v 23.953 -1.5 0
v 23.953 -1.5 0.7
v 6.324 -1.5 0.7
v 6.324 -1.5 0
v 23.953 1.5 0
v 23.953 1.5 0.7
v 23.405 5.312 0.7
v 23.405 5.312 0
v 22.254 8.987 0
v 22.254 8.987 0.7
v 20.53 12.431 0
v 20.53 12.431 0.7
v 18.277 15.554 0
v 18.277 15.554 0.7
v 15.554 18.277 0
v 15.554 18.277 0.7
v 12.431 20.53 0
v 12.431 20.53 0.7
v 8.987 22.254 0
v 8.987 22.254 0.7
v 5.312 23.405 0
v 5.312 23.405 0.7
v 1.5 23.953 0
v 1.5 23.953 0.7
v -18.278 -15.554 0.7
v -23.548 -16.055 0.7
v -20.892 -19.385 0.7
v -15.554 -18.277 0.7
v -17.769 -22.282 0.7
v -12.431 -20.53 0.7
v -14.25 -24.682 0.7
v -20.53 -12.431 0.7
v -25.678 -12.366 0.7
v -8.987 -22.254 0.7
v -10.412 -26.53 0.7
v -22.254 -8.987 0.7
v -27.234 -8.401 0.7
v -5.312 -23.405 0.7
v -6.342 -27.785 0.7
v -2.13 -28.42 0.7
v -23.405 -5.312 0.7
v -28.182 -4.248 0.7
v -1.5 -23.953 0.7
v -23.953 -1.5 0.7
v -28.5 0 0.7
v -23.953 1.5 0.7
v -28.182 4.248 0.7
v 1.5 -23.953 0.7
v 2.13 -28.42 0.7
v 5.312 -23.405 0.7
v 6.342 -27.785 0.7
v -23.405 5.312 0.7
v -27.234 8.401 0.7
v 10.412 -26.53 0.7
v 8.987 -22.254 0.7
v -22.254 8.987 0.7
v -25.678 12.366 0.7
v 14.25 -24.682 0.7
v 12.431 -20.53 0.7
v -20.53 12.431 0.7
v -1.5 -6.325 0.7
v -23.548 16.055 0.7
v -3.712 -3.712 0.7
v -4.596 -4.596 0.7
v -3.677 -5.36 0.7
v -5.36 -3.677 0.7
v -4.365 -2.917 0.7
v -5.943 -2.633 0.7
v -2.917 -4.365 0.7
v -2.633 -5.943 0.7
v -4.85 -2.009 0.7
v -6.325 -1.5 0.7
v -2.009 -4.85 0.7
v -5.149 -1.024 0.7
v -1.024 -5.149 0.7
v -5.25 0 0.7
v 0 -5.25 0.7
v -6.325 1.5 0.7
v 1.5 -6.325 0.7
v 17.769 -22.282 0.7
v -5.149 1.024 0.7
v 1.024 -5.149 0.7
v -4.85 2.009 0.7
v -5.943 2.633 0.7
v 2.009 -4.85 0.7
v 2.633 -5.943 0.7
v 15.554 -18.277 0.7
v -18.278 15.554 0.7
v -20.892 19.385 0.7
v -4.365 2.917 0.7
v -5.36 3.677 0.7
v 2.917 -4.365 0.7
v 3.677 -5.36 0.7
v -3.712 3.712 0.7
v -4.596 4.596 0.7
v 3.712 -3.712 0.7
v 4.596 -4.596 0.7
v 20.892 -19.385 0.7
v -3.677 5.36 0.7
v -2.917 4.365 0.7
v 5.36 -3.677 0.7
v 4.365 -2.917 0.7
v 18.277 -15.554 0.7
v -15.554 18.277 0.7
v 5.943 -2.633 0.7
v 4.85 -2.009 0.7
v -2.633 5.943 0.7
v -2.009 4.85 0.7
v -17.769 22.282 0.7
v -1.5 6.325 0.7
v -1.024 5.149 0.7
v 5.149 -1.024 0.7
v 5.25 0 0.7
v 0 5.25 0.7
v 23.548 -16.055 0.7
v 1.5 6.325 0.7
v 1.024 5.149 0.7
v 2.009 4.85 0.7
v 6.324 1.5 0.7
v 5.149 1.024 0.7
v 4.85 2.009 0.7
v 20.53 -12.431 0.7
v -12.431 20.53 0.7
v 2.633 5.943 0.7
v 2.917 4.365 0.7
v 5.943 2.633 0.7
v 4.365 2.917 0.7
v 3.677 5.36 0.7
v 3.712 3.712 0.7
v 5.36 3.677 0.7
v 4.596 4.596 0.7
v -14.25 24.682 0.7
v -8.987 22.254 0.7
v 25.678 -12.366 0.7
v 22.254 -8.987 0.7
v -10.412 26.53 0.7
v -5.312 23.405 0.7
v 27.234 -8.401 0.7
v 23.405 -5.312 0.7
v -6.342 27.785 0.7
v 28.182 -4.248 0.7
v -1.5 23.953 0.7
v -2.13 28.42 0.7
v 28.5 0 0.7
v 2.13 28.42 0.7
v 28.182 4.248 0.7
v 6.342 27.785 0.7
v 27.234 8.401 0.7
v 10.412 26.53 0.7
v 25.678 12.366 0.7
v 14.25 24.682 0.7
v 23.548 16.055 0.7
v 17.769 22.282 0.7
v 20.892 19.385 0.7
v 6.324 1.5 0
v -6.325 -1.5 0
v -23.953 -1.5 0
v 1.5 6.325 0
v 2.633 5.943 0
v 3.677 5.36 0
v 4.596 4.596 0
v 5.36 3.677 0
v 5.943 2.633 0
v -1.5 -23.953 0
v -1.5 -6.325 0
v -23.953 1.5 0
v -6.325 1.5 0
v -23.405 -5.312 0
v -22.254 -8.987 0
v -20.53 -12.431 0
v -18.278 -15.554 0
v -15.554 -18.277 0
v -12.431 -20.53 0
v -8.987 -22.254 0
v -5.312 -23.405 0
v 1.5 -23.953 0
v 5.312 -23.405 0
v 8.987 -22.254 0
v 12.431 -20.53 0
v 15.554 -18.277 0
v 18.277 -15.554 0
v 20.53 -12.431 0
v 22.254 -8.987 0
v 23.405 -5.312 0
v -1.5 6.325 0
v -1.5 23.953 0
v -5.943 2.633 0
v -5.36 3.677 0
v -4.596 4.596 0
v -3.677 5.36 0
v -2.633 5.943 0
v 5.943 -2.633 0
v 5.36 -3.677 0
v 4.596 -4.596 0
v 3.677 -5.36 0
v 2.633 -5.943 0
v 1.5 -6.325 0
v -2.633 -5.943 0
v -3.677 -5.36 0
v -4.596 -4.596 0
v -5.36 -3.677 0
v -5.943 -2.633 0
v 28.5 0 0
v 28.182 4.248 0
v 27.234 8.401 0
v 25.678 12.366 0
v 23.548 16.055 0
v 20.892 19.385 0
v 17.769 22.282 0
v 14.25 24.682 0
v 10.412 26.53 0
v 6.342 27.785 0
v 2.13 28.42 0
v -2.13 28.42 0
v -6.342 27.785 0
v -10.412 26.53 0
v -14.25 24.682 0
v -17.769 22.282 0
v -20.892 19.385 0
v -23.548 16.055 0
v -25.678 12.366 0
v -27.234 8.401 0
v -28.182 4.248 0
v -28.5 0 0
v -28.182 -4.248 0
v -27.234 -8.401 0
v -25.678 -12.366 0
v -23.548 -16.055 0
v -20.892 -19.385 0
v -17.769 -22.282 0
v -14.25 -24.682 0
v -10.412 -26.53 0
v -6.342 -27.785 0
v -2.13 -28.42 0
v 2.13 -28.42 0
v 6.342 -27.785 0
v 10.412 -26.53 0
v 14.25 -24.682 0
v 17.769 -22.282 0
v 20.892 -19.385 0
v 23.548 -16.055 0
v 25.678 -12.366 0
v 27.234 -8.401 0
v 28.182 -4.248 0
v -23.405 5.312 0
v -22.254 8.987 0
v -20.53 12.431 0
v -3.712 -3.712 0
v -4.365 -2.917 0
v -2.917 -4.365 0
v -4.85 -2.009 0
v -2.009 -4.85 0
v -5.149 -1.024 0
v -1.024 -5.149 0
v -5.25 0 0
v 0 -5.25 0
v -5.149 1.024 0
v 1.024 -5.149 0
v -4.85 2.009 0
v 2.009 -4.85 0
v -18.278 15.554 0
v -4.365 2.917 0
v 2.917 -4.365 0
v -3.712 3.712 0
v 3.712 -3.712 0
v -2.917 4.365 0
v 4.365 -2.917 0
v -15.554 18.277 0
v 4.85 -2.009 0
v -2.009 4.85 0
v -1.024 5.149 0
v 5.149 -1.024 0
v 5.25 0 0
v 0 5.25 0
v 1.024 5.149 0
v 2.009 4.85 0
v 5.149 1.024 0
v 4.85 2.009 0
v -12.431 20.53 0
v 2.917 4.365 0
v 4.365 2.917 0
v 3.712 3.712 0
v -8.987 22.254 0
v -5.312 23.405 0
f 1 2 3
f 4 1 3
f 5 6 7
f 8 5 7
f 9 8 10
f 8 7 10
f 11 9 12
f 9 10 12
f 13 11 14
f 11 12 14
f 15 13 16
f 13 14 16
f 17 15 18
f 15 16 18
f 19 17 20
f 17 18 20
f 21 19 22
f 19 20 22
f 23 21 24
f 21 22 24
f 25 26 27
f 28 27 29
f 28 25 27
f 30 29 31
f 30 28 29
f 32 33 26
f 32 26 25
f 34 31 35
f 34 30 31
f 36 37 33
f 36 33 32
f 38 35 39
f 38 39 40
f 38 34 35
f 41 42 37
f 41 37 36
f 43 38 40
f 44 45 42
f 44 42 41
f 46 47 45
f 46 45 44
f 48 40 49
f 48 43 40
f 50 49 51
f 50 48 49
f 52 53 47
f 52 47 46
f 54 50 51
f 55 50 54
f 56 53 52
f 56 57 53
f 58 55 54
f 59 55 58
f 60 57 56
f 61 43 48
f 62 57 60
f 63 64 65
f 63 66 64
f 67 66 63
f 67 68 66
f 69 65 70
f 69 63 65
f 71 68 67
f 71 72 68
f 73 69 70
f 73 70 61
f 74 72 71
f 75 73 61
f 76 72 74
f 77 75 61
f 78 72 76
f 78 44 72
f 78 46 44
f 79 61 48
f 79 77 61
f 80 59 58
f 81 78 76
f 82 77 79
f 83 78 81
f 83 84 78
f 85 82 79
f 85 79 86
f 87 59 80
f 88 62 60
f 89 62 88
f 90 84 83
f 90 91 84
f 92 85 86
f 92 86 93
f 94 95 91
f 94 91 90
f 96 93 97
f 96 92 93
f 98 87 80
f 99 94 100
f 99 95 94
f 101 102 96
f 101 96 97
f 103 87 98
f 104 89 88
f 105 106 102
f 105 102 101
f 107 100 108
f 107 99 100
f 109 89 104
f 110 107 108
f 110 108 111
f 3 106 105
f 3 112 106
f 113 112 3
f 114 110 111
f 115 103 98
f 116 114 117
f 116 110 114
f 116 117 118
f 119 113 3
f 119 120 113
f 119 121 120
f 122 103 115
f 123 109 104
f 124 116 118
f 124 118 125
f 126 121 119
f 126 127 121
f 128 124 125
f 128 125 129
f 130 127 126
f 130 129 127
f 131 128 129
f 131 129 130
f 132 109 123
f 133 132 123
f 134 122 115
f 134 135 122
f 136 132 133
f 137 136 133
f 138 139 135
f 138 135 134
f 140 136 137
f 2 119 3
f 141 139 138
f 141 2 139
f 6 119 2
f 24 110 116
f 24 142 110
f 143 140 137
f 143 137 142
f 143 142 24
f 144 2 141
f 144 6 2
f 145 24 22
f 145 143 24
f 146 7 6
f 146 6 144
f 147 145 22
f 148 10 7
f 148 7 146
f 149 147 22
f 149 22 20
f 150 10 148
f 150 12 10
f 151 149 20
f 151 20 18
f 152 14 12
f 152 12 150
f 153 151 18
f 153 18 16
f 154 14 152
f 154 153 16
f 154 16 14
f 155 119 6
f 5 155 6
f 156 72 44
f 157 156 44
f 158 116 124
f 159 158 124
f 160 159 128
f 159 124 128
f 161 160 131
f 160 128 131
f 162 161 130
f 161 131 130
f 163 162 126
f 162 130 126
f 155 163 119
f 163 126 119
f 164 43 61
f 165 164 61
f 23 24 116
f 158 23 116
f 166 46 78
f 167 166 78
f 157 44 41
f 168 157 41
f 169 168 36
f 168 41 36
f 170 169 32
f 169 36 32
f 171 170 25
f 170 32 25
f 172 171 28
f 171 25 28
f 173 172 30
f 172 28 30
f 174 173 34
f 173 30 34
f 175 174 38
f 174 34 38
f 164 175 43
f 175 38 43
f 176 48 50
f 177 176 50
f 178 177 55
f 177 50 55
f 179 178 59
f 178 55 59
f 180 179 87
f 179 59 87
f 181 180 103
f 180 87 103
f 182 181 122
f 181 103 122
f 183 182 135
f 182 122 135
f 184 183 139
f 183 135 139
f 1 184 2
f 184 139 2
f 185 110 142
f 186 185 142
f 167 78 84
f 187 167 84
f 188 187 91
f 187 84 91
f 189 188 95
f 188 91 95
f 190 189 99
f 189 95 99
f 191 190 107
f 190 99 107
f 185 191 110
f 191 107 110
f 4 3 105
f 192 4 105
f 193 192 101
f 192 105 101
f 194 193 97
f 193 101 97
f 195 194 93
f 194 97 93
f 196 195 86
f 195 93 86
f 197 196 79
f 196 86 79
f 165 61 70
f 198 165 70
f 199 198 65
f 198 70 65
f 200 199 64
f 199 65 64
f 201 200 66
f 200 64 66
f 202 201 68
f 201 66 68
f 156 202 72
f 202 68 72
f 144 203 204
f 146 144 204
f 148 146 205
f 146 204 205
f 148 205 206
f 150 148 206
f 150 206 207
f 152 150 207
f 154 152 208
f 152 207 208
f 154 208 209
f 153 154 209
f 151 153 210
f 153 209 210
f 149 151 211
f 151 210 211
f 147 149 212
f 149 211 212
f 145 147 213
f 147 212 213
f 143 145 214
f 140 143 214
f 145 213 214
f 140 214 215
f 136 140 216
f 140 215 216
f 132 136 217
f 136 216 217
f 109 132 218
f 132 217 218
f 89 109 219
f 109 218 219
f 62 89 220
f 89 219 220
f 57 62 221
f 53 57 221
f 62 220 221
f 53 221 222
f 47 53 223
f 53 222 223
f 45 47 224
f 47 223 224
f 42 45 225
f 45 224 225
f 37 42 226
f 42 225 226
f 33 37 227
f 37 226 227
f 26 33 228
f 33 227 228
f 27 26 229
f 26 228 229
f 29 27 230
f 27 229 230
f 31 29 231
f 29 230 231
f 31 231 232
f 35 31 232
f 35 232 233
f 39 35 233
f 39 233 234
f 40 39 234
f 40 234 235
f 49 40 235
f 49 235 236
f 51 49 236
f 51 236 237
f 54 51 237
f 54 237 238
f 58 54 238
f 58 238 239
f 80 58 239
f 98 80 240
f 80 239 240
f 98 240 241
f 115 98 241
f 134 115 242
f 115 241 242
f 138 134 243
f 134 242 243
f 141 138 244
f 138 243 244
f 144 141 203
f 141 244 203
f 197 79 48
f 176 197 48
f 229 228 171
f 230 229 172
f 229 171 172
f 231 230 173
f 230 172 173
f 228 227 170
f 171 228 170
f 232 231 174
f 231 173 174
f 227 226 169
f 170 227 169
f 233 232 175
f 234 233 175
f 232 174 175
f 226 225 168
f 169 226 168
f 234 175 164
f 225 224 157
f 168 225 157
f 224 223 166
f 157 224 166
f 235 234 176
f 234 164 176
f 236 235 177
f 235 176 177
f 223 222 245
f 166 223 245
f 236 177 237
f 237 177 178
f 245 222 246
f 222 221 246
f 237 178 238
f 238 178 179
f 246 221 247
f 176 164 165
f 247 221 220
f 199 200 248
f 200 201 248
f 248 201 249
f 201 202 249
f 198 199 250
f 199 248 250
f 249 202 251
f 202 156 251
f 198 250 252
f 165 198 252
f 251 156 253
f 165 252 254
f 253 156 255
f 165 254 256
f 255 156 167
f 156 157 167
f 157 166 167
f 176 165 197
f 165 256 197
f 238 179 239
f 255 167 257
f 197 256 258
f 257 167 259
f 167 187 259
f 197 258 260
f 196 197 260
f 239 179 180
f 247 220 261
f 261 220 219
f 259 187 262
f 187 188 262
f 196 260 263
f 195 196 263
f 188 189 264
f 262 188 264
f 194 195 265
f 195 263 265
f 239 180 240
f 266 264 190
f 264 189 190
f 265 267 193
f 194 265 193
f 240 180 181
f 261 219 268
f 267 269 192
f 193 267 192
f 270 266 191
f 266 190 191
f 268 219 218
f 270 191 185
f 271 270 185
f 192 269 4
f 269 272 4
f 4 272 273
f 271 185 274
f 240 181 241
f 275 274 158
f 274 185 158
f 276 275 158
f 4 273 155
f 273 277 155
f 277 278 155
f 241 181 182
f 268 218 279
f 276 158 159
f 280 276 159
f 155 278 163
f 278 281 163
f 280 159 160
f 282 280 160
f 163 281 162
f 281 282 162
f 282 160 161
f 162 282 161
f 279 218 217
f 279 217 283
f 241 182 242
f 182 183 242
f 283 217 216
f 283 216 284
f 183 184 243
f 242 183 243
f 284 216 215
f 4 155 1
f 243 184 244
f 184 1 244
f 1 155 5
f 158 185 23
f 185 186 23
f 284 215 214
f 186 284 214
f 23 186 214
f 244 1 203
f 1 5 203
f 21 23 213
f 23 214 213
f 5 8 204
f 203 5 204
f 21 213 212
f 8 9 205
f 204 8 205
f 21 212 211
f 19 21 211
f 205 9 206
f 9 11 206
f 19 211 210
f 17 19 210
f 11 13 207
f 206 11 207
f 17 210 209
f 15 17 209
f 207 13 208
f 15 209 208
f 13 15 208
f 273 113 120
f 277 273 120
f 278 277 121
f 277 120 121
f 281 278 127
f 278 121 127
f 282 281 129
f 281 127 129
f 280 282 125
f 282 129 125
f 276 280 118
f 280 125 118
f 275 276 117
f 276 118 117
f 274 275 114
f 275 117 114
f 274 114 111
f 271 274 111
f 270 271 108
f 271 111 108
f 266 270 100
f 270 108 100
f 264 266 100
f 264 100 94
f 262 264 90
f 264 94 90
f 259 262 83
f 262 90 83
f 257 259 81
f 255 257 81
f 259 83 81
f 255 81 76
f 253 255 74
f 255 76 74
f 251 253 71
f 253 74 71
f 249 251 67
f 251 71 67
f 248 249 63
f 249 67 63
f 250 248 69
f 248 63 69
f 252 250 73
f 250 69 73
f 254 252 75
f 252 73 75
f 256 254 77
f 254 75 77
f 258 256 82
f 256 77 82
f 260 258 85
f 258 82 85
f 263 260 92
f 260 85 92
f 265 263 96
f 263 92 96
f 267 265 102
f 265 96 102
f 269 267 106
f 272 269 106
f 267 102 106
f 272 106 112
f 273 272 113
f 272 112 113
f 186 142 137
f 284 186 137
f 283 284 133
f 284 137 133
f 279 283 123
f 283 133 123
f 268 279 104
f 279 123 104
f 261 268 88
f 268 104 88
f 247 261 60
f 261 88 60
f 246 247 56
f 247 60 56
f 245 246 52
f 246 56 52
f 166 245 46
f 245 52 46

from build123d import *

# Parameters (mm, degrees)
F0_R     = 28.5
F1_DEPTH = 0.7
F2_R     = 5.25
F3_DEPTH = 0.7
F5_DEPTH = 0.7


with BuildPart() as f1:
    # F0 (on Top) → F1 (new body)
    with BuildSketch(Plane.XY):
        Circle(F0_R)
    extrude(amount=F1_DEPTH)

    # F2 (on face) → F3 (cut, through all)
    with BuildSketch(Plane.XY.offset(0.7)):
        Circle(F2_R)
    extrude(amount=-F3_DEPTH, mode=Mode.SUBTRACT)

    # F4 (on face) → F5 (cut, through all)
    with BuildSketch(Plane.XY.offset(0.7)):
        with BuildLine():
            Line((-1.500154, 6.324555), (-1.500154, 23.953079))
            ThreePointArc((-1.500154, 23.953079), (-16.970717, 16.970563), (-23.953233, 1.5))
            Line((-23.953233, 1.5), (-6.324709, 1.5))
            ThreePointArc((-6.324709, 1.5), (-4.596348, 4.596194), (-1.500154, 6.324555))
        make_face()
        with BuildLine():
            Line((6.324401, 1.5), (23.952925, 1.5))
            ThreePointArc((23.952925, 1.5), (16.970409, 16.970563), (1.499846, 23.953079))
            Line((1.499846, 23.953079), (1.499846, 6.324555))
            ThreePointArc((1.499846, 6.324555), (4.59604, 4.596194), (6.324401, 1.5))
        make_face()
        with BuildLine():
            ThreePointArc((1.499846, -23.953079), (16.970409, -16.970563), (23.952925, -1.5))
            Line((23.952925, -1.5), (6.324401, -1.5))
            ThreePointArc((6.324401, -1.5), (4.59604, -4.596194), (1.499846, -6.324555))
            Line((1.499846, -6.324555), (1.499846, -23.953079))
        make_face()
        with BuildLine():
            ThreePointArc((-23.953233, -1.5), (-16.970717, -16.970563), (-1.500154, -23.953079))
            Line((-1.500154, -23.953079), (-1.500154, -6.324555))
            ThreePointArc((-1.500154, -6.324555), (-4.596348, -4.596194), (-6.324709, -1.5))
            Line((-6.324709, -1.5), (-23.953233, -1.5))
        make_face()
    extrude(amount=-F5_DEPTH, mode=Mode.SUBTRACT)


solid = f1.part
